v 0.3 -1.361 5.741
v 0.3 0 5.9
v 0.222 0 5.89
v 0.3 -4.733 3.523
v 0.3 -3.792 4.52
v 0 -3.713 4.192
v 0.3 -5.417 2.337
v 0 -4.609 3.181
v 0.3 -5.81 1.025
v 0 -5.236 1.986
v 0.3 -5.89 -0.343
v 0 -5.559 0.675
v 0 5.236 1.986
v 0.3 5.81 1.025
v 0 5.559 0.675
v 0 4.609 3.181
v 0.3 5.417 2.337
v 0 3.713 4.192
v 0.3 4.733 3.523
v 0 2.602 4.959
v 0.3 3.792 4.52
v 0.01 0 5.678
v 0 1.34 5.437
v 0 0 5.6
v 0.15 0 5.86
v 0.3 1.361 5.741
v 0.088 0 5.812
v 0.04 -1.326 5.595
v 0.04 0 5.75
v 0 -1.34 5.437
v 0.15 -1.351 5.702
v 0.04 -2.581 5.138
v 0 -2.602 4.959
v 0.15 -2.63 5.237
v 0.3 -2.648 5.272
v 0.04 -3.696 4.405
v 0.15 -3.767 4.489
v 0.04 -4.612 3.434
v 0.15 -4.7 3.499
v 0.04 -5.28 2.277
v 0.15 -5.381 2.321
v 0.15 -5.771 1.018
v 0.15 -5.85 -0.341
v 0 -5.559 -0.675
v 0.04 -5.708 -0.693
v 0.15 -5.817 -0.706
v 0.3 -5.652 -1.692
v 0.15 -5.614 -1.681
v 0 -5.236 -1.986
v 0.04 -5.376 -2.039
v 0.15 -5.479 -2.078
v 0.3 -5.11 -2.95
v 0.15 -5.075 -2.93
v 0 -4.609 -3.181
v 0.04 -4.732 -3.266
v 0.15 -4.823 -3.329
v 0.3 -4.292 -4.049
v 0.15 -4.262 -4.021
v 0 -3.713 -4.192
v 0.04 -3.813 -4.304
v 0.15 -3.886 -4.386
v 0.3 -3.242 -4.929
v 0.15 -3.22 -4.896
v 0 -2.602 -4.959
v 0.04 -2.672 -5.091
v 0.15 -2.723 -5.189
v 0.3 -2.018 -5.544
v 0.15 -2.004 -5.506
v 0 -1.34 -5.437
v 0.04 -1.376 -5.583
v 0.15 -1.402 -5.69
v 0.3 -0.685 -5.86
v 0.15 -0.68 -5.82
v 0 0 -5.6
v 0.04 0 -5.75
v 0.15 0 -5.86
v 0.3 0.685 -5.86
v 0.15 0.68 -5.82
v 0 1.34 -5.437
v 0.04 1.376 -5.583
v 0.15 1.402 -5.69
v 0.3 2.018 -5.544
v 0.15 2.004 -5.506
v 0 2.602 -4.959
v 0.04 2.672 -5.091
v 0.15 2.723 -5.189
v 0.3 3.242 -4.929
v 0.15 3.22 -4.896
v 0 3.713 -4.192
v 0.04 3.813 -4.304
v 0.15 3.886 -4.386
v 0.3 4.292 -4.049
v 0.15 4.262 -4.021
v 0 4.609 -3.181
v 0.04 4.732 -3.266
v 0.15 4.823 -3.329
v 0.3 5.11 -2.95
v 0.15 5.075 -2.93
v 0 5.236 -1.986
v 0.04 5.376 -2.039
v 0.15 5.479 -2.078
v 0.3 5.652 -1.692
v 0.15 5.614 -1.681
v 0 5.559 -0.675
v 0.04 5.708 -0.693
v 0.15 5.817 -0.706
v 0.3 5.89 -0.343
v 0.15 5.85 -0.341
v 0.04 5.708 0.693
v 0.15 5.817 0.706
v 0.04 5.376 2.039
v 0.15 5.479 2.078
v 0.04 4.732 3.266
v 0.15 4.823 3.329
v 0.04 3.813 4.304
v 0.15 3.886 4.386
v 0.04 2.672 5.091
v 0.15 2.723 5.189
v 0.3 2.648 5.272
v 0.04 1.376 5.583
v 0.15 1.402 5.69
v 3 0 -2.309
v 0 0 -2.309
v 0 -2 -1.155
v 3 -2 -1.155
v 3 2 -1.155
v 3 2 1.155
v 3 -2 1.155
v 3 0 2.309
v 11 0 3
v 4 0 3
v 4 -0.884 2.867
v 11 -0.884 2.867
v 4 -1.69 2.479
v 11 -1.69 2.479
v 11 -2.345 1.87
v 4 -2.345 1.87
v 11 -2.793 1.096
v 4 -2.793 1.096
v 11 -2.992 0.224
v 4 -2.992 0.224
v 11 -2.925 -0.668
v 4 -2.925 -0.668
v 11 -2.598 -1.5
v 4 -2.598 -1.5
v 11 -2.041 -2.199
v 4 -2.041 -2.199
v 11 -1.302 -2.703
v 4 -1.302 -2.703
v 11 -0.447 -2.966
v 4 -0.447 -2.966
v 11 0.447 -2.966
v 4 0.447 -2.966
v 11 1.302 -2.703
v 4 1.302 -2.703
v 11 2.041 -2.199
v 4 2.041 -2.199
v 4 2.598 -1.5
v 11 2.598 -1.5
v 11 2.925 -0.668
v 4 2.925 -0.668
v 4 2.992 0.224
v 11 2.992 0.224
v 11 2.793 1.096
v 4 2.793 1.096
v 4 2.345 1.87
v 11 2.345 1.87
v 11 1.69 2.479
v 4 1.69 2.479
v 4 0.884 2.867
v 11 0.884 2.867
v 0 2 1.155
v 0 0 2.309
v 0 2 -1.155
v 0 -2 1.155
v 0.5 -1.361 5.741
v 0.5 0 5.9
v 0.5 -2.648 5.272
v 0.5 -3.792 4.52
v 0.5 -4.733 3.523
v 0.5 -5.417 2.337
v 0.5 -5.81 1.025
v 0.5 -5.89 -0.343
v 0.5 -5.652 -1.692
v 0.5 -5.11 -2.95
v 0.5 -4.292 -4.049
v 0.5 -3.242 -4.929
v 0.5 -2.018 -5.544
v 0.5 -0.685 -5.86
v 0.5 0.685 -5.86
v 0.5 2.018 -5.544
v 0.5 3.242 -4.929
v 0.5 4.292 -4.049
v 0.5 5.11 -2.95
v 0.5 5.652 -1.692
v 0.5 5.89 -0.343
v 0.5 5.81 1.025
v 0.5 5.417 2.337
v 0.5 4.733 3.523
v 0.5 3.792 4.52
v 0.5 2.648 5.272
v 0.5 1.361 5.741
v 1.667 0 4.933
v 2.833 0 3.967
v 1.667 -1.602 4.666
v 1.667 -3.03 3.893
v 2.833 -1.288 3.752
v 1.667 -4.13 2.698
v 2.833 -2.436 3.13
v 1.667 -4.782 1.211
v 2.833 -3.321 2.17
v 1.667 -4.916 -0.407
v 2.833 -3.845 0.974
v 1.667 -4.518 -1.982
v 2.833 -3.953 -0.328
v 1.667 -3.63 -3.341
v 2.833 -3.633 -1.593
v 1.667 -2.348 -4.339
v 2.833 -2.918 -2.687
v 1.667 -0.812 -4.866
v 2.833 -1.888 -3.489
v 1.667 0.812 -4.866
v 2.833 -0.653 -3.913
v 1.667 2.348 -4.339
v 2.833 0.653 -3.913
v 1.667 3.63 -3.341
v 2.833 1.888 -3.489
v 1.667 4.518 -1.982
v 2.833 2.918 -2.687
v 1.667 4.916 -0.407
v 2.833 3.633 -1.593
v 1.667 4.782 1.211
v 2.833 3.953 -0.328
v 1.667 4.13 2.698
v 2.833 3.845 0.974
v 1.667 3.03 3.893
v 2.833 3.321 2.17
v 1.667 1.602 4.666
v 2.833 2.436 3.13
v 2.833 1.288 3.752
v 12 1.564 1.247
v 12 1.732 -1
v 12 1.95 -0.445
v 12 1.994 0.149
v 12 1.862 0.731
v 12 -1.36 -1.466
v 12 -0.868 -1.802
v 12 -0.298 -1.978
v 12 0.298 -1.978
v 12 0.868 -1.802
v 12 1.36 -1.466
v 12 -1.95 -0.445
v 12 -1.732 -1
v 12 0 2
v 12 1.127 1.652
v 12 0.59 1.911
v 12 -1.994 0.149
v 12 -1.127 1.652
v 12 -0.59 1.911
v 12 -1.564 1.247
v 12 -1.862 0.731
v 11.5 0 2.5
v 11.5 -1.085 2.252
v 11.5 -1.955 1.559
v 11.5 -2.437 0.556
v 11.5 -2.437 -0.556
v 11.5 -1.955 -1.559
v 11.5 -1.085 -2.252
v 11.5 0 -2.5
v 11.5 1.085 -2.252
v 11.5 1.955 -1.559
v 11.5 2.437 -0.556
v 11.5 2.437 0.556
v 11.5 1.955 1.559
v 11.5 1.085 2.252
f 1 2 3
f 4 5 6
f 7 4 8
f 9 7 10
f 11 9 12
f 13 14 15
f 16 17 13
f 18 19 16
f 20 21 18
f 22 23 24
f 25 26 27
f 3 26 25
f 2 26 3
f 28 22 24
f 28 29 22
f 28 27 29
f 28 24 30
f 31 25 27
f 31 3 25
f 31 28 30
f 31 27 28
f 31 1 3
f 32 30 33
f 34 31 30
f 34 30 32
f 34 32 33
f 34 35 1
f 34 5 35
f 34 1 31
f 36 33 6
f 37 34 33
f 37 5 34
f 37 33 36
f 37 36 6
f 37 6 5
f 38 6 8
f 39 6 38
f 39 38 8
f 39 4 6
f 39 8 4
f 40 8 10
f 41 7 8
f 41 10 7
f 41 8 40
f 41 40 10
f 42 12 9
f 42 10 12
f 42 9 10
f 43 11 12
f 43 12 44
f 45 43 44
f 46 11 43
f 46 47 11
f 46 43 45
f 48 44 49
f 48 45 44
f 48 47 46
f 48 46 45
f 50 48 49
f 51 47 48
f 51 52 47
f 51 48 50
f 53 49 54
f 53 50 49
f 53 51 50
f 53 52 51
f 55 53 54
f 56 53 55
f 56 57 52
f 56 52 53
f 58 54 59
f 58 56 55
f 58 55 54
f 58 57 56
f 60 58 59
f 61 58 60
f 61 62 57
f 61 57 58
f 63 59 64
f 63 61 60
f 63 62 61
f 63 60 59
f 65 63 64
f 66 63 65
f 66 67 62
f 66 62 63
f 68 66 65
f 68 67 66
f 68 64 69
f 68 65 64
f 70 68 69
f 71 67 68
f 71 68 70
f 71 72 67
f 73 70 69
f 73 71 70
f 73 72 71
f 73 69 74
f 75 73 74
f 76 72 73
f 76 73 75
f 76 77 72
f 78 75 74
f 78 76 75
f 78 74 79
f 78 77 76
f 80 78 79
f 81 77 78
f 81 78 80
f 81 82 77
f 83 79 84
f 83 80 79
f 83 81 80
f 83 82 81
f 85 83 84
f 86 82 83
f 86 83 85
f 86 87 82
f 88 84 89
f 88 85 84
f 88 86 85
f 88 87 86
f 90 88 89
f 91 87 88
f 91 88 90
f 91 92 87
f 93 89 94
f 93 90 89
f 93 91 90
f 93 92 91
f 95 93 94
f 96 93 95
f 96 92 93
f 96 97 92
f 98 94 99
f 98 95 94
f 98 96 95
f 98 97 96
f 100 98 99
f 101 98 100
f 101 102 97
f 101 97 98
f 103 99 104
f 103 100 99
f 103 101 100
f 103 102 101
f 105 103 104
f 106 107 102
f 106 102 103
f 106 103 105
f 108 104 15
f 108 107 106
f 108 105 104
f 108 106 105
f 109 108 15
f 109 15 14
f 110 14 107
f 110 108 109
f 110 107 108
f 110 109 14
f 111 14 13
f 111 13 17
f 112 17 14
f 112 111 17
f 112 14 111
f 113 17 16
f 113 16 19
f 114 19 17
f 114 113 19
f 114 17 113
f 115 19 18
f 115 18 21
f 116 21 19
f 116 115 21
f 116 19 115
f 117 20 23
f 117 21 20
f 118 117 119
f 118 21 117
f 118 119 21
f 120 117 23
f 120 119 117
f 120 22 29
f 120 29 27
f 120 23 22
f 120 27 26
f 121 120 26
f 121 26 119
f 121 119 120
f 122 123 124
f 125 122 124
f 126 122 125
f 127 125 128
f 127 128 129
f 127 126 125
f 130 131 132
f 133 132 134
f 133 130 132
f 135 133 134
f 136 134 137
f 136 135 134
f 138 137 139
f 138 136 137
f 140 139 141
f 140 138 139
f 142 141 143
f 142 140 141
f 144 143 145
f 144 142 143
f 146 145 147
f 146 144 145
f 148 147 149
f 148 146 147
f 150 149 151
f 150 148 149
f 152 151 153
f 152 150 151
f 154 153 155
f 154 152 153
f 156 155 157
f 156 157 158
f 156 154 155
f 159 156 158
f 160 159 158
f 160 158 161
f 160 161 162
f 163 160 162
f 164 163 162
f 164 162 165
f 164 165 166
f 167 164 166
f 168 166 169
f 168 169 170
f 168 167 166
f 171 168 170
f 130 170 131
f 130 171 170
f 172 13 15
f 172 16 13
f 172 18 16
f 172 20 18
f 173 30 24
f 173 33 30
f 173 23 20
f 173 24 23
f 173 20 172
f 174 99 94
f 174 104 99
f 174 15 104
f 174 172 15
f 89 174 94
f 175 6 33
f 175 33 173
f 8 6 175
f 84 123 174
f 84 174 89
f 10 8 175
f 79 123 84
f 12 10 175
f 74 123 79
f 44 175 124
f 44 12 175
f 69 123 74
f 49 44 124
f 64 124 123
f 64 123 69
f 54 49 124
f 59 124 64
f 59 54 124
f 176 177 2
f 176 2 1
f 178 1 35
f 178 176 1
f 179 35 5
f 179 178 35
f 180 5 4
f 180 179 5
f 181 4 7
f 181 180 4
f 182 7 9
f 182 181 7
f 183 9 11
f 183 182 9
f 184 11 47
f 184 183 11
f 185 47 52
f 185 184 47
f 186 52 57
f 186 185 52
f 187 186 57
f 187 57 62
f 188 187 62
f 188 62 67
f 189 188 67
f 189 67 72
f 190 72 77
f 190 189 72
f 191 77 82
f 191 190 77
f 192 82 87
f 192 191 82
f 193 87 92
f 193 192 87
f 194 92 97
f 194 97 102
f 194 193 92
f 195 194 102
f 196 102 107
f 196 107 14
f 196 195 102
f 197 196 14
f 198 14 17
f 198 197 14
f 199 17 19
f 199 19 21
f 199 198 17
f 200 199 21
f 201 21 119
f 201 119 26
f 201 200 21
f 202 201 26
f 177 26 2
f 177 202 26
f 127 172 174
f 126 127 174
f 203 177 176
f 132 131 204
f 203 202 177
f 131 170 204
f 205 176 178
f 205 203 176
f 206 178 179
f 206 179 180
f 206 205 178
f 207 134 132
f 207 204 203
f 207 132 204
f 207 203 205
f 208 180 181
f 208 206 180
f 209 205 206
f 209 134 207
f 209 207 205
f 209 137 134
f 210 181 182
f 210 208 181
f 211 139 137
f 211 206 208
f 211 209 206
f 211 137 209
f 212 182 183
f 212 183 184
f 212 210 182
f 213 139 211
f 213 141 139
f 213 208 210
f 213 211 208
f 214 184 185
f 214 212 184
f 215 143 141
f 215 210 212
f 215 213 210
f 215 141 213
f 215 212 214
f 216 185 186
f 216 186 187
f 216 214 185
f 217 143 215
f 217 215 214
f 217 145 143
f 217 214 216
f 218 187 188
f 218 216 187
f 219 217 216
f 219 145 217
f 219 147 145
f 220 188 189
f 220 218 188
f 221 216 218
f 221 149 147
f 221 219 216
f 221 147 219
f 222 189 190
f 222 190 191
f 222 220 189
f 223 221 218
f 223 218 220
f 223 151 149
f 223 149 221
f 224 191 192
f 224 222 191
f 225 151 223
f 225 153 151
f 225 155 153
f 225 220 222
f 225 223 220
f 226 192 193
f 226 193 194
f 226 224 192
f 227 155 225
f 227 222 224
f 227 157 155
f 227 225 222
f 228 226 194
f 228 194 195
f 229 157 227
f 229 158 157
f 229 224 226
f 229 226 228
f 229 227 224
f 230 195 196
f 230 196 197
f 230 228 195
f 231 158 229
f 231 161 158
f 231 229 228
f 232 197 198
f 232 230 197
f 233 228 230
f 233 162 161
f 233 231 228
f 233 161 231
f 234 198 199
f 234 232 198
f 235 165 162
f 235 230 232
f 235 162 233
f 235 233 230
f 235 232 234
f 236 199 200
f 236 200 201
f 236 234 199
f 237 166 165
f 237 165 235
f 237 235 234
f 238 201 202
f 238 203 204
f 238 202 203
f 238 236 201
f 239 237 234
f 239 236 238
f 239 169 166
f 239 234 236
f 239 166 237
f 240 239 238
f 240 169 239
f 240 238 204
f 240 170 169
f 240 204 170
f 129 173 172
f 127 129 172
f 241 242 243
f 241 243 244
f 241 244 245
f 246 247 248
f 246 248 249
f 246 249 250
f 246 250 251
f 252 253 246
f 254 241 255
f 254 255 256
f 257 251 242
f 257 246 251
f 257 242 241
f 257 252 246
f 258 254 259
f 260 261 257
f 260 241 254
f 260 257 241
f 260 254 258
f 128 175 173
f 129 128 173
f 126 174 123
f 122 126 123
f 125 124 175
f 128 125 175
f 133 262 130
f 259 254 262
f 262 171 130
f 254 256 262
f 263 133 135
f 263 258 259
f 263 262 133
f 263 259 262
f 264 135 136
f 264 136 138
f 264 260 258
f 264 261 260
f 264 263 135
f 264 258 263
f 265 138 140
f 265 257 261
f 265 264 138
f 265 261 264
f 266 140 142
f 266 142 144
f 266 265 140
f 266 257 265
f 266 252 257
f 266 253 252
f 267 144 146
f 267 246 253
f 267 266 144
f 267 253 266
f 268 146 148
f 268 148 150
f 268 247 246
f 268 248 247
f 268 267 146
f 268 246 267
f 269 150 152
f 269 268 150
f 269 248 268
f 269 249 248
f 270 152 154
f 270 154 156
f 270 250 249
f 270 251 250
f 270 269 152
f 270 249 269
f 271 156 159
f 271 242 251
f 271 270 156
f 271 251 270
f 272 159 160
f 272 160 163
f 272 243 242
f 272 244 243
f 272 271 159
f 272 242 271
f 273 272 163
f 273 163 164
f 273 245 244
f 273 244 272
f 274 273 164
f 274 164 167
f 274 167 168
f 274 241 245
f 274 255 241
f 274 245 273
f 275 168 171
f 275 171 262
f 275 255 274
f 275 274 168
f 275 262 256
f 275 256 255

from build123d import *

# Parameters (mm, degrees)
CUT_EXTRUDE_1_DEPTH = 3
FILLET_1_R          = 0.3
CHAMFER_1_SIZE      = 1


with BuildPart() as part:
    # Эскиз1 → Повернуть1 (revolve)
    with BuildSketch(Plane.XY, mode=Mode.PRIVATE) as revolve_1_sk:
        Polygon((0, 0), (0, 5.9), (0.5, 5.9), (4, 3), (12, 3), (12, 0), align=None)
    revolve(revolve_1_sk.sketch.rotate(Axis((0, 0, 0), (1, 0, 0)), 90), axis=Axis((0, 0, 0), (1, 0, 0)))  # turned: the seam where the file's is

    # Эскиз2 → Вырез-Вытянуть1 (cut)
    with BuildSketch(Plane.ZY):
        Polygon((1.154700538, 2), (-1.154700538, 2), (-2.309401077, 0), (-1.154700538, -2), (1.154700538, -2), (2.309401077, 0), align=None)
    extrude(amount=-CUT_EXTRUDE_1_DEPTH, mode=Mode.SUBTRACT)

    # Скругление1
    fillet_1_edges = [part.edges().sort_by_distance(p)[0] for p in [
        (0, 0, -5.9),
    ]]
    fillet(fillet_1_edges, radius=FILLET_1_R)

    # Фаска1
    chamfer_1_edges = [part.edges().sort_by_distance(p)[0] for p in [
        (12, 0, -3),
    ]]
    chamfer(chamfer_1_edges, length=CHAMFER_1_SIZE)


solid = part.part
